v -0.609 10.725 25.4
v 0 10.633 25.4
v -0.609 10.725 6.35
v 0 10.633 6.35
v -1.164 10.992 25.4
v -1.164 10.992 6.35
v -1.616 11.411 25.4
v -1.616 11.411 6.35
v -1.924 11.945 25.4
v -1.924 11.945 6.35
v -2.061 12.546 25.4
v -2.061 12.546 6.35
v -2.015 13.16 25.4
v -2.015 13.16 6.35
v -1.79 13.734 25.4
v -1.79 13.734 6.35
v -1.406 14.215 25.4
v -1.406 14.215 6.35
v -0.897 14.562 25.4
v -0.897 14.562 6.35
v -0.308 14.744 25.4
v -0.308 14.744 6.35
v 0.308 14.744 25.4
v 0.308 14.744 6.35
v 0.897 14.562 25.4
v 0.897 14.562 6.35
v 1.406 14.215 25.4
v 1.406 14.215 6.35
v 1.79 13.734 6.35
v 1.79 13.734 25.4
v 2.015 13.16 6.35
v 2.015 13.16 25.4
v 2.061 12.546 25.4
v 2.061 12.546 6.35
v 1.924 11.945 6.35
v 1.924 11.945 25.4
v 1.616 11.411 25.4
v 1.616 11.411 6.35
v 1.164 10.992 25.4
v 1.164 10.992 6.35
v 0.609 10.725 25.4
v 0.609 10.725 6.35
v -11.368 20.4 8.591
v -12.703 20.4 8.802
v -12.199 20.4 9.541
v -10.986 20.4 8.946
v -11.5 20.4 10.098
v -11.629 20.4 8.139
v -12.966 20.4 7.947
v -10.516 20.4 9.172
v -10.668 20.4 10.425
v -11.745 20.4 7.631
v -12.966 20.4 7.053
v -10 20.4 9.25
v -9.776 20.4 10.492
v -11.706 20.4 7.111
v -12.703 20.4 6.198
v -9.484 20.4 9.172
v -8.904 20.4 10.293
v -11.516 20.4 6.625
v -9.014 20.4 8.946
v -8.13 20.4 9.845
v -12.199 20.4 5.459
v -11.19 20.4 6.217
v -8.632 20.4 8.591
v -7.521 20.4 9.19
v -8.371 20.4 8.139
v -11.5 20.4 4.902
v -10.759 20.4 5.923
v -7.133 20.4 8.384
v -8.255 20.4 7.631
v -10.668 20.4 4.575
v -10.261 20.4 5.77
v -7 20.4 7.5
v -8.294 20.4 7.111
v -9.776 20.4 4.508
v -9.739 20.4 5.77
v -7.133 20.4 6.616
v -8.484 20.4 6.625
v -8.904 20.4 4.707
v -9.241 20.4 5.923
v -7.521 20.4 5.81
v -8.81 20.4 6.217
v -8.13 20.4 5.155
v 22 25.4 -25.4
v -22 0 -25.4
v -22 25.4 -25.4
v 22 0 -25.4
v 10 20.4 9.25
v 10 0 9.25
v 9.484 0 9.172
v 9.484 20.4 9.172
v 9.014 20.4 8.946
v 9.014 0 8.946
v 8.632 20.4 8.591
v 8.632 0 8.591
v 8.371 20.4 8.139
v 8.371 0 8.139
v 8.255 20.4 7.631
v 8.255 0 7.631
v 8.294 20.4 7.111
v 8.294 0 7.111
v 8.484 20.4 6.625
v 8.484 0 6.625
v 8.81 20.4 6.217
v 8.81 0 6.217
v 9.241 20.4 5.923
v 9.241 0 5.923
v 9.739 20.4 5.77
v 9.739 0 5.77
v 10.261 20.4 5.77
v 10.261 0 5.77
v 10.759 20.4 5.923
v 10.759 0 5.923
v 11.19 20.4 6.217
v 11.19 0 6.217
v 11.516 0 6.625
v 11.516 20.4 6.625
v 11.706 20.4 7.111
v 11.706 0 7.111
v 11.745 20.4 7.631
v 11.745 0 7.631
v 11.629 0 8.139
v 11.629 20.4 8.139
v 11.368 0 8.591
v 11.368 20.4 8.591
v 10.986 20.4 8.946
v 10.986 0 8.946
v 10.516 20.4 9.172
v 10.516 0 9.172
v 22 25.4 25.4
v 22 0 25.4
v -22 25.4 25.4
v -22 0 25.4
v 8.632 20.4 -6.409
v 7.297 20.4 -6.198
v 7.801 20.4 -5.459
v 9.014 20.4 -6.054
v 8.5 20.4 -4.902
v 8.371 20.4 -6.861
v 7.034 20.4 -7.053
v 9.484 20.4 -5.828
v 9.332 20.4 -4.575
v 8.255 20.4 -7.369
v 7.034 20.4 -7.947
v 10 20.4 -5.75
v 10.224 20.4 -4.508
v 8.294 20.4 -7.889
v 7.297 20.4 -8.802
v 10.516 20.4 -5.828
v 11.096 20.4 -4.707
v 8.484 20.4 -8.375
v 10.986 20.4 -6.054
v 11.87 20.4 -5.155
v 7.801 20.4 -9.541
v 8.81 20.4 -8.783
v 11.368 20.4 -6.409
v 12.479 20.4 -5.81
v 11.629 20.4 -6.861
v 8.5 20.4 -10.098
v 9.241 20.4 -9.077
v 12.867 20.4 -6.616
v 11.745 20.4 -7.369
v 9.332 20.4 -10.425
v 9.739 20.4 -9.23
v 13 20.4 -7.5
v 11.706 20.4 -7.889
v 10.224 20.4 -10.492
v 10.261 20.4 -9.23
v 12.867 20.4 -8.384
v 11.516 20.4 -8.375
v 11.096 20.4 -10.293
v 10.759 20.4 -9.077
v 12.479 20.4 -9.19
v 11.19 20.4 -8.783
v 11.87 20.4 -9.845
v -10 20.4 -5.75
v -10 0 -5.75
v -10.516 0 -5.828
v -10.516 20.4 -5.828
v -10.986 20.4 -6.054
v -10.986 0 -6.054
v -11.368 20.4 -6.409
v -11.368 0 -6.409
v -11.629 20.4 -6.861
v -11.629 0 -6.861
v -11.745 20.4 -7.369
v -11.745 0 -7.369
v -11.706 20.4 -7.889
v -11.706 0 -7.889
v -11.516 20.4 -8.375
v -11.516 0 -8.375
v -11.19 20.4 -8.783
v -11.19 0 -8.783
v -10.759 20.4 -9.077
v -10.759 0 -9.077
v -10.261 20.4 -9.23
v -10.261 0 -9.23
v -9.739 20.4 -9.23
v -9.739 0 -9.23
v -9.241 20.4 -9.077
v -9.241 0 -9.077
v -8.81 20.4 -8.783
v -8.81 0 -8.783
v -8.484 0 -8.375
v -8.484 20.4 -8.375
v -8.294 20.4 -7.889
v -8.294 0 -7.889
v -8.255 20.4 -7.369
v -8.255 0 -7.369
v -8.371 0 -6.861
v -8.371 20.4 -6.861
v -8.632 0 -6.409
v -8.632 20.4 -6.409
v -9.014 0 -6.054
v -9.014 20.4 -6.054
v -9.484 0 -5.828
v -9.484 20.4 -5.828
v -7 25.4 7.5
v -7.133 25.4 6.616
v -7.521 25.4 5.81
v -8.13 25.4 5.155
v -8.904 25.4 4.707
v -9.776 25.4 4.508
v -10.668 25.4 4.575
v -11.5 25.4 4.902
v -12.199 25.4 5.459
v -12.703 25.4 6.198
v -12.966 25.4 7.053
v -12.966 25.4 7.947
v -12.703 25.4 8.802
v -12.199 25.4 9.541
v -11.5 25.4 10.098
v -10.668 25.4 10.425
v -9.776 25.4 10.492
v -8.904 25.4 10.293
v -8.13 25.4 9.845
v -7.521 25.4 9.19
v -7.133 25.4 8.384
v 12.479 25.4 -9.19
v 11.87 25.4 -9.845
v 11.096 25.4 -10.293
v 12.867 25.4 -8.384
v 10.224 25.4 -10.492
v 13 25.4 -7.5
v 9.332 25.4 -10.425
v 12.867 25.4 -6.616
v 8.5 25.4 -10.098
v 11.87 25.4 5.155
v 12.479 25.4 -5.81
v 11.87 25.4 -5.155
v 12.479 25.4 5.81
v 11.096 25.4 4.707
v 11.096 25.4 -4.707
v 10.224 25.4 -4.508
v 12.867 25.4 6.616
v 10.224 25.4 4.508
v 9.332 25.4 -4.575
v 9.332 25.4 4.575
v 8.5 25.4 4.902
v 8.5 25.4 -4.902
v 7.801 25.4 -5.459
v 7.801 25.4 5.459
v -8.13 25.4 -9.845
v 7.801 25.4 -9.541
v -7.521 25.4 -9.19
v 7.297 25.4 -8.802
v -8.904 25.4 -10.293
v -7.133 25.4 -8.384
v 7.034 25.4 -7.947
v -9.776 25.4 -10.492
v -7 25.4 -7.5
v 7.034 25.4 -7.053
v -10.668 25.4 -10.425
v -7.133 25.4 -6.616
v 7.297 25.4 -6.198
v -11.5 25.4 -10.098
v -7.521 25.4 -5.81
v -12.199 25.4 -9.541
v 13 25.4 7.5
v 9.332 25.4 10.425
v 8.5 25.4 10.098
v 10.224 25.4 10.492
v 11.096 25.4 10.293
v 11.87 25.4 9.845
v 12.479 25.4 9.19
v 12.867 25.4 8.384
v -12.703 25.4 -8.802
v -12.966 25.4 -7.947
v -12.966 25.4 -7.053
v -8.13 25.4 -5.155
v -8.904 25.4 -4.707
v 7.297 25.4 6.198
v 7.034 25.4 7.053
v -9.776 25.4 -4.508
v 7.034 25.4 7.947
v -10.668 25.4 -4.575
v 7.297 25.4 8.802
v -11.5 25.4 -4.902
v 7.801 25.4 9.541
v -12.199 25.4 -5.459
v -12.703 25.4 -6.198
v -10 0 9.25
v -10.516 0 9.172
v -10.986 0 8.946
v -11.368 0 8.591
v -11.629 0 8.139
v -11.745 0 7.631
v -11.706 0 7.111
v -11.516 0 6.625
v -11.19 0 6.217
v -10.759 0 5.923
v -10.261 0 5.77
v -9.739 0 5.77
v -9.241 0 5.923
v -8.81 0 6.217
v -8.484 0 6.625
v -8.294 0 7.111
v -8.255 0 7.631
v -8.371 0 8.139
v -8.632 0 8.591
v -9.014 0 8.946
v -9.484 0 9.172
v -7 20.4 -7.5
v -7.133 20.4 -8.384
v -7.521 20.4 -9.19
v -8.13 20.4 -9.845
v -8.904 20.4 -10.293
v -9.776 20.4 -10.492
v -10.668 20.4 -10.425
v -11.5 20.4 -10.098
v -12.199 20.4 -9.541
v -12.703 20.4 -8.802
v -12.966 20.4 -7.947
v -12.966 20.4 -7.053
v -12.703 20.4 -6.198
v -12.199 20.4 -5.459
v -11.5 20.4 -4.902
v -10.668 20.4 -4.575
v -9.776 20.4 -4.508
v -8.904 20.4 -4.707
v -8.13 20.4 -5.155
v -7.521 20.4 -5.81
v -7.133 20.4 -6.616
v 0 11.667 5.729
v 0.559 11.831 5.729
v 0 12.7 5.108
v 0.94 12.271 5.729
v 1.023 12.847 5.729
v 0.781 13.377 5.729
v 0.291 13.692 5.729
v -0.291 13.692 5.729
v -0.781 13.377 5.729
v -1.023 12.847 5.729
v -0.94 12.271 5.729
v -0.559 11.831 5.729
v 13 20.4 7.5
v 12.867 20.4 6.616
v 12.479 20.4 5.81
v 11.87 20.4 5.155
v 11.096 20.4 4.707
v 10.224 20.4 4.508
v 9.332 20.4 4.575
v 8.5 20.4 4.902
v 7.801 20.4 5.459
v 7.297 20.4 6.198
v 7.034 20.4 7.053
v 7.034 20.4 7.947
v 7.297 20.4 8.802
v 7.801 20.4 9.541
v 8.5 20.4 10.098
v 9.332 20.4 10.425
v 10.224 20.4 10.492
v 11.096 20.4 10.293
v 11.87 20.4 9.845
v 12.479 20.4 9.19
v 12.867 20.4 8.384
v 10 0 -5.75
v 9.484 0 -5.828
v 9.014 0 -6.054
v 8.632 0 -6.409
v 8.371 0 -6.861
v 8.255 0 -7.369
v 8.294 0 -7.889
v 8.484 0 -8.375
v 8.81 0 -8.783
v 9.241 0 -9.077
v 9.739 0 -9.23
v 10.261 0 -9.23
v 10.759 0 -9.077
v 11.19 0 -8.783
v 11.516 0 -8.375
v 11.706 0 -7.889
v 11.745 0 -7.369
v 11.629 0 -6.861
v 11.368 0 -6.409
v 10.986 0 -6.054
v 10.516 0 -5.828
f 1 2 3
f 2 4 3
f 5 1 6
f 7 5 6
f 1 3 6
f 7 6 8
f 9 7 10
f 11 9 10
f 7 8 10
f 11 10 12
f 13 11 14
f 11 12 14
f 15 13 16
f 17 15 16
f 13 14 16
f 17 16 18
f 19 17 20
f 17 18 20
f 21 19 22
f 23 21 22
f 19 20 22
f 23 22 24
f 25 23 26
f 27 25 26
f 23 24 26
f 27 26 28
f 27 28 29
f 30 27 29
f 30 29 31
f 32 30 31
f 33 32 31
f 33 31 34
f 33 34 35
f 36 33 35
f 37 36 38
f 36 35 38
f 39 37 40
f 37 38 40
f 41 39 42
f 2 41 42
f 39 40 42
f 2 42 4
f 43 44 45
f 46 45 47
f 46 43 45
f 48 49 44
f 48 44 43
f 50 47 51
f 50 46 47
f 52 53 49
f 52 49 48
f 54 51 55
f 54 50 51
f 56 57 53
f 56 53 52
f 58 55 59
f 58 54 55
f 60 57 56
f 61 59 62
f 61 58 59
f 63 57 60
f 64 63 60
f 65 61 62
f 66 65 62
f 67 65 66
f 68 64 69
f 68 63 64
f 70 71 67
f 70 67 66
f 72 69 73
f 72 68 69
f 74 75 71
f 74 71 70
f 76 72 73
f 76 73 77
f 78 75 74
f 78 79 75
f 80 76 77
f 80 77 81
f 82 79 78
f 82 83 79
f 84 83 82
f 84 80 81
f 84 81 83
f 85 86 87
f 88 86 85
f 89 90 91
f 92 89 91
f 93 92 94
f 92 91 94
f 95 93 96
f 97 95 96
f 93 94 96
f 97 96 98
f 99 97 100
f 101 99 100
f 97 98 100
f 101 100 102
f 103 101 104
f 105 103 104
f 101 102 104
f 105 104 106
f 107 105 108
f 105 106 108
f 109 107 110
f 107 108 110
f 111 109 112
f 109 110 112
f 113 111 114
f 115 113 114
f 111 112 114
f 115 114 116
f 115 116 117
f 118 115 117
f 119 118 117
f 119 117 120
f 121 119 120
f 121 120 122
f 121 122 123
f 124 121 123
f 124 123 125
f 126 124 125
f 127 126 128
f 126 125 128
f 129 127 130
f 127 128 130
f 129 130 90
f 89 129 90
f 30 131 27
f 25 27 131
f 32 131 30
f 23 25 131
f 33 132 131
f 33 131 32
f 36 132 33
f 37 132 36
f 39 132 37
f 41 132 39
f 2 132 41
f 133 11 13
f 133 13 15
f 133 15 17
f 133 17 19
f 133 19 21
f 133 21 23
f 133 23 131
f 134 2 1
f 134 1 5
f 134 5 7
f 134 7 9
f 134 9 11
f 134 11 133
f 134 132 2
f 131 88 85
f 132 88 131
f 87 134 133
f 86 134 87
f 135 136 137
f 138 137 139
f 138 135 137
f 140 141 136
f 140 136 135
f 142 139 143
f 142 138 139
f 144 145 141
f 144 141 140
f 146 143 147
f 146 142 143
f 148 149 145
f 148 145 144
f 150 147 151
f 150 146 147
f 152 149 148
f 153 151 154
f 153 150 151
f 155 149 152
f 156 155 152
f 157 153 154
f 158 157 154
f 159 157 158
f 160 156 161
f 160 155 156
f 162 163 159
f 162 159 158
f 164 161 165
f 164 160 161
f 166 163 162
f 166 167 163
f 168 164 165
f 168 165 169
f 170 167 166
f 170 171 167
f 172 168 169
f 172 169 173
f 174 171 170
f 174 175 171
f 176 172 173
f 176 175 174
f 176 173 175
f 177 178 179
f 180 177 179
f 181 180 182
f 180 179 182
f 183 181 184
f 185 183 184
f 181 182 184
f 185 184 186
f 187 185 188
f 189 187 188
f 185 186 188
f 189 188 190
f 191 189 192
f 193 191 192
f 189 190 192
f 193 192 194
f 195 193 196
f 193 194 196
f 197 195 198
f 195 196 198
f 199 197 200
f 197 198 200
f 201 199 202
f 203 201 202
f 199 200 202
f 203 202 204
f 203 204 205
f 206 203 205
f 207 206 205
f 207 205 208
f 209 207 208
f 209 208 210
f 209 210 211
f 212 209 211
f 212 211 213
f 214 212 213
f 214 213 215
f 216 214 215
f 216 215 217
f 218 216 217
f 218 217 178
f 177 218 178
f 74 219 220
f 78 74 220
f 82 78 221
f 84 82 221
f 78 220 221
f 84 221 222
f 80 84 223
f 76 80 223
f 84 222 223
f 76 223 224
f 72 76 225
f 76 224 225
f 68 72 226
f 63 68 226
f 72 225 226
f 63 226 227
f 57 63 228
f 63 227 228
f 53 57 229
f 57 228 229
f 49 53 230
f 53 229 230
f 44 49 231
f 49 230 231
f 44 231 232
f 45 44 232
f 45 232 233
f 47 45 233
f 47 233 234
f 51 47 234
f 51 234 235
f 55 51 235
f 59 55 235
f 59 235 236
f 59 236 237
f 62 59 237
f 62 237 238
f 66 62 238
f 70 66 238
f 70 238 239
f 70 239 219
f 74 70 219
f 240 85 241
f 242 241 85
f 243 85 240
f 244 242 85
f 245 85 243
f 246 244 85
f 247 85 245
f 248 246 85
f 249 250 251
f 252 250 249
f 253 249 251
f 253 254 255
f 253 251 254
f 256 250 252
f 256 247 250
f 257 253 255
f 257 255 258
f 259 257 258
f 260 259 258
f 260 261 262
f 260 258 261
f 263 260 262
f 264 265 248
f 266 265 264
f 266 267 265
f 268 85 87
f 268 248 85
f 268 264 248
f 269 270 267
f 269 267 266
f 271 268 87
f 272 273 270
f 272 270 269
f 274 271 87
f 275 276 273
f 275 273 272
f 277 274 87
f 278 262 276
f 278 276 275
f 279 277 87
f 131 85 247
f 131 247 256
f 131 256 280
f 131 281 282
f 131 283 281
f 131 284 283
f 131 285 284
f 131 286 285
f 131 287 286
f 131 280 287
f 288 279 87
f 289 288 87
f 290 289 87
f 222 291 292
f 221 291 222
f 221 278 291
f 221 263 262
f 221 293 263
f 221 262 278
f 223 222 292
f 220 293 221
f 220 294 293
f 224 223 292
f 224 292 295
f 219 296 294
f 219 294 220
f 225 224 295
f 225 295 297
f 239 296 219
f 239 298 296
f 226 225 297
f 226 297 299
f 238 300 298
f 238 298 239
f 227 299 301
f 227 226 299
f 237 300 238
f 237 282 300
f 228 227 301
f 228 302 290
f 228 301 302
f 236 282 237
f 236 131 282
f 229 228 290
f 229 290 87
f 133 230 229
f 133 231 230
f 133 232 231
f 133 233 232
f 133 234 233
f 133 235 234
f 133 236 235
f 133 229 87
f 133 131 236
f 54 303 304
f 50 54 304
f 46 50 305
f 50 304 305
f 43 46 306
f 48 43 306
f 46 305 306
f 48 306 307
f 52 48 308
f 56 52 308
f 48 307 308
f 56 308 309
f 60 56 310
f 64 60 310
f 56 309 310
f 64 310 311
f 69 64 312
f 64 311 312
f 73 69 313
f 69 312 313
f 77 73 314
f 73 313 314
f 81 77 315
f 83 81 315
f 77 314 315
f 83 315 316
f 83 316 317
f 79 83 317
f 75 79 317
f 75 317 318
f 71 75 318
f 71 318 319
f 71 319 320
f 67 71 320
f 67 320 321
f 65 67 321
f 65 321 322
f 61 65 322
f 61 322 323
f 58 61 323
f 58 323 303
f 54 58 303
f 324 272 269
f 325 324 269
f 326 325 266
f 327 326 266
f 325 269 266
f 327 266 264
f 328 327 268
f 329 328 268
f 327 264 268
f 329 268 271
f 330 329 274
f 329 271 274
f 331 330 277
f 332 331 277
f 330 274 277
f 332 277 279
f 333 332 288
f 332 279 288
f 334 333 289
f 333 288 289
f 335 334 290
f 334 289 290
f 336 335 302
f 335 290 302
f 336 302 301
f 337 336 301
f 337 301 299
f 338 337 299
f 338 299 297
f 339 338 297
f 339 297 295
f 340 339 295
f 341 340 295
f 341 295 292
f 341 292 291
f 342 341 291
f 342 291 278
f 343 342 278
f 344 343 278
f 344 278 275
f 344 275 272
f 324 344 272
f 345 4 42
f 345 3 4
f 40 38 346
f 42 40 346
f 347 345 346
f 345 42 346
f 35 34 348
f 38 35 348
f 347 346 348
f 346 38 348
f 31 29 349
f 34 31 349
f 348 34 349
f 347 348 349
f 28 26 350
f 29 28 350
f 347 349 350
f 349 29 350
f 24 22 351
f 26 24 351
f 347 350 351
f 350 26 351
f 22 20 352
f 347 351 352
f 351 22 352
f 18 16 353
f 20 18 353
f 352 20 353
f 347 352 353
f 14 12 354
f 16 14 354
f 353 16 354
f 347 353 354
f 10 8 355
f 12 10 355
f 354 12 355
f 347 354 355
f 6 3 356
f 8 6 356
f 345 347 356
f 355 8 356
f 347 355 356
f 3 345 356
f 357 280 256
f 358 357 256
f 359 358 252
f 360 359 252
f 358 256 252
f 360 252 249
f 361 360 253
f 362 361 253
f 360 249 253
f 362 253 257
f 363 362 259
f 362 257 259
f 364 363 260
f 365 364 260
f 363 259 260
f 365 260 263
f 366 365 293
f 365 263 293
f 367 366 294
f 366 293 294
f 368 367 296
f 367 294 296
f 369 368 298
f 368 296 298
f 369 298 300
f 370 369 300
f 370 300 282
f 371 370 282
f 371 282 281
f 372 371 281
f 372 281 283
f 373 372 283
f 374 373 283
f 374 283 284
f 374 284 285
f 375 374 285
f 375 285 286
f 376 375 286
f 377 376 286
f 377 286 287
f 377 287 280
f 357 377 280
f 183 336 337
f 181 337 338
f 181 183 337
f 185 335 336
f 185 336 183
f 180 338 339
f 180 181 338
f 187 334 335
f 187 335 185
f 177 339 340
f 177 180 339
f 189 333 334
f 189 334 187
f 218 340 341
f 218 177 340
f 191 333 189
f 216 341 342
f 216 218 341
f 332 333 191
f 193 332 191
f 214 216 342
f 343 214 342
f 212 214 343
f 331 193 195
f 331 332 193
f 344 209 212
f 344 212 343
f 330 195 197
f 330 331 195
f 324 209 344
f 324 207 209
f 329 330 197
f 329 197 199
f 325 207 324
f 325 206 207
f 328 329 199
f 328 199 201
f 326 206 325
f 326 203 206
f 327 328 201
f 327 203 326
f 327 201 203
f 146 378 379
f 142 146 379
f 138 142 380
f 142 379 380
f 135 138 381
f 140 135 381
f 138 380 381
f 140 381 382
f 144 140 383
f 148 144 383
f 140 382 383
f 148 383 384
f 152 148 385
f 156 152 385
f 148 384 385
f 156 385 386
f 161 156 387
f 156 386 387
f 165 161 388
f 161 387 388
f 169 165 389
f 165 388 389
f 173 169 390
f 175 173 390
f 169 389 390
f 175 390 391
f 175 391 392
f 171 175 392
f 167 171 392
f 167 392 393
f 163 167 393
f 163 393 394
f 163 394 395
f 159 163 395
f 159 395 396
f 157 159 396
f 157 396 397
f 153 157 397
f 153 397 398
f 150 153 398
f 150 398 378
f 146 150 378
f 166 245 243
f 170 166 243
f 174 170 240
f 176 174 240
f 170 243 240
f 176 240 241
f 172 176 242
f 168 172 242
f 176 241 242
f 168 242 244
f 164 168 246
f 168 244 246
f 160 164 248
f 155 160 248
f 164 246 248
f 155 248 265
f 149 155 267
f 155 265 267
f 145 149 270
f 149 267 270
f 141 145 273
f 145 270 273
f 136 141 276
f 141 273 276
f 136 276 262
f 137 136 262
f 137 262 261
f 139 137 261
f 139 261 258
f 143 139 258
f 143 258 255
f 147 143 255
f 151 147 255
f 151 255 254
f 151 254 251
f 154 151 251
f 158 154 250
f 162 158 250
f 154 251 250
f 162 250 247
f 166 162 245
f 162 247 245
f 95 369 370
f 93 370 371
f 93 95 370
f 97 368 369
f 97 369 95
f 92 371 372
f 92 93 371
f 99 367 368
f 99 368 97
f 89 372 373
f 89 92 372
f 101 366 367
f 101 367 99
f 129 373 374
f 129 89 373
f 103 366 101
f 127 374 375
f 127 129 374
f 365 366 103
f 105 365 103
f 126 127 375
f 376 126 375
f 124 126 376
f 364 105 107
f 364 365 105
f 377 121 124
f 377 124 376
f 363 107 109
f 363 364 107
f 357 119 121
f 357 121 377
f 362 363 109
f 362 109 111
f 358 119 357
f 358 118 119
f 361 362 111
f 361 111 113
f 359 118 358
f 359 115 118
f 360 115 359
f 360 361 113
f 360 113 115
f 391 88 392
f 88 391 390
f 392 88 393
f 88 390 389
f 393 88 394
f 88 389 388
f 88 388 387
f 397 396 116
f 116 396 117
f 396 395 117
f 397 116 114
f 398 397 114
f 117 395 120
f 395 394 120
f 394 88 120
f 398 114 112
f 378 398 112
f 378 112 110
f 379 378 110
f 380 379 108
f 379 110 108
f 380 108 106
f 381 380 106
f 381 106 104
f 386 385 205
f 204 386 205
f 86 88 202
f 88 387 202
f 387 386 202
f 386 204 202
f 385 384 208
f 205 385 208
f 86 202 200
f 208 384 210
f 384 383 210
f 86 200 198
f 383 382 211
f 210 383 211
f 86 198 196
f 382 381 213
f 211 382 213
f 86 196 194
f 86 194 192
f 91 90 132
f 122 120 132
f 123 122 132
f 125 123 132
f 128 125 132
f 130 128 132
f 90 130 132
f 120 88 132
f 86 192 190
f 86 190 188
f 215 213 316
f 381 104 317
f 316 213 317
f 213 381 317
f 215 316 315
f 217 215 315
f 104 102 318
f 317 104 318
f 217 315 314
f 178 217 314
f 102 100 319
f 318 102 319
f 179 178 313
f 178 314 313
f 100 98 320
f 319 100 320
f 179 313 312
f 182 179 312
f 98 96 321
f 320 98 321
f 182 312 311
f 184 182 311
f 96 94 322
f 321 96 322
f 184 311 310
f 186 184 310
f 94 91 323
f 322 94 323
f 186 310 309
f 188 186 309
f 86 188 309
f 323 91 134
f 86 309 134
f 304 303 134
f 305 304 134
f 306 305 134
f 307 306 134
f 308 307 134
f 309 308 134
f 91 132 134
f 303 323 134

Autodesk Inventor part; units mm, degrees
ref_plane "YZ Plane" through (0, 0, 0) normal (1, 0, 0) x (0, 1, 0)
ref_plane "XZ Plane" through (0, 0, 0) normal (0, 1, 0) x (-1, 0, 0)
ref_plane "XY Plane" through (0, 0, 0) normal (0, 0, 1) x (1, 0, 0)
sketch "Sketch2" plane through (0, 0, 0) normal (0, 1, 0) x (-1, 0, 0)
  line L0 (-22, 25.4) -> (22, 25.4)
  line L1 (22, 25.4) -> (22, -25.4)
  line L2 (22, -25.4) -> (-22, -25.4)
  line L3 (-22, -25.4) -> (-22, 25.4)
  line L4 (-22, 25.4) -> (22, -25.4) construction
  line L5 (22, 25.4) -> (-22, -25.4) construction
  point P0 (0, 0)
  dimension "d0" = 50.8
  dimension "d1" = 44
extrude "Extrusion1" add sketch "Sketch2" along normal blind 25.4
sketch "Sketch3" plane through (-22, 0, 25.4) normal (0, 0, 1) x (1, 0, 0)
  line L0 (0, 25.4) -> (44, 25.4) construction
  line L1 (0, 0) -> (44, 0) construction
  line L2 (44, 0) -> (44, 25.4) construction
  line L3 (44, 25.4) -> (0, 25.4) construction
  line L4 (0, 25.4) -> (0, 0) construction
  line L5 (0, 0) -> (44, 25.4) construction
  line L6 (44, 0) -> (0, 25.4) construction
  point P0 (22, 0)
  point P1 (22, 12.7)
hole "Hole1" at (0, 12.7, 25.4) direction (0, 0, -1) diameter 4.134 depth 19.05 tip angle 118 thread size "M5x0.8" class "6H" standard "ANSI Metric M Profile"
sketch "Sketch4" plane through (0, 25.4, 0) normal (0, 1, 0) x (1, 0, 0)
  line L0 (10, -7.5) -> (10, 7.5) construction
  line L1 (10, 7.5) -> (-10, 7.5) construction
  line L2 (-10, 7.5) -> (-10, -7.5) construction
  line L3 (-10, -7.5) -> (10, -7.5) construction
  line L4 (10, -7.5) -> (-10, 7.5) construction
  line L5 (10, 7.5) -> (-10, -7.5) construction
  circle A0 centre (-10, 7.5) radius 3
  circle A1 centre (10, 7.5) radius 3
  circle A2 centre (10, -7.5) radius 3
  circle A3 centre (-10, -7.5) radius 3
  point P0 (0, 0)
  dimension "d15" = 20
  dimension "d16" = 15
  dimension "d14" = 6
  dimension "d13" = 6
  dimension "d12" = 6
  dimension "d11" = 6
extrude "Extrusion2" cut sketch "Sketch4" against normal blind 5
sketch "Sketch5" plane through (-10, 20.4, 7.5) normal (0, 1, 0) x (1, 0, 0)
  circle A0 centre (0, 15) radius 3 projected
  circle A1 centre (20, 0) radius 3 projected
  circle A2 centre (20, 15) radius 3 projected
  point P0 (16, 18)
  point P1 (0, 0)
hole "Hole2" at (-10, 20.4, -7.5) at (-10, 20.4, 7.5) at (10, 20.4, 7.5) at (10, 20.4, -7.5) direction (0, -1, 0) diameter 3.5 end through all
properties part number "Mass 3" material "Steel, Mild"
